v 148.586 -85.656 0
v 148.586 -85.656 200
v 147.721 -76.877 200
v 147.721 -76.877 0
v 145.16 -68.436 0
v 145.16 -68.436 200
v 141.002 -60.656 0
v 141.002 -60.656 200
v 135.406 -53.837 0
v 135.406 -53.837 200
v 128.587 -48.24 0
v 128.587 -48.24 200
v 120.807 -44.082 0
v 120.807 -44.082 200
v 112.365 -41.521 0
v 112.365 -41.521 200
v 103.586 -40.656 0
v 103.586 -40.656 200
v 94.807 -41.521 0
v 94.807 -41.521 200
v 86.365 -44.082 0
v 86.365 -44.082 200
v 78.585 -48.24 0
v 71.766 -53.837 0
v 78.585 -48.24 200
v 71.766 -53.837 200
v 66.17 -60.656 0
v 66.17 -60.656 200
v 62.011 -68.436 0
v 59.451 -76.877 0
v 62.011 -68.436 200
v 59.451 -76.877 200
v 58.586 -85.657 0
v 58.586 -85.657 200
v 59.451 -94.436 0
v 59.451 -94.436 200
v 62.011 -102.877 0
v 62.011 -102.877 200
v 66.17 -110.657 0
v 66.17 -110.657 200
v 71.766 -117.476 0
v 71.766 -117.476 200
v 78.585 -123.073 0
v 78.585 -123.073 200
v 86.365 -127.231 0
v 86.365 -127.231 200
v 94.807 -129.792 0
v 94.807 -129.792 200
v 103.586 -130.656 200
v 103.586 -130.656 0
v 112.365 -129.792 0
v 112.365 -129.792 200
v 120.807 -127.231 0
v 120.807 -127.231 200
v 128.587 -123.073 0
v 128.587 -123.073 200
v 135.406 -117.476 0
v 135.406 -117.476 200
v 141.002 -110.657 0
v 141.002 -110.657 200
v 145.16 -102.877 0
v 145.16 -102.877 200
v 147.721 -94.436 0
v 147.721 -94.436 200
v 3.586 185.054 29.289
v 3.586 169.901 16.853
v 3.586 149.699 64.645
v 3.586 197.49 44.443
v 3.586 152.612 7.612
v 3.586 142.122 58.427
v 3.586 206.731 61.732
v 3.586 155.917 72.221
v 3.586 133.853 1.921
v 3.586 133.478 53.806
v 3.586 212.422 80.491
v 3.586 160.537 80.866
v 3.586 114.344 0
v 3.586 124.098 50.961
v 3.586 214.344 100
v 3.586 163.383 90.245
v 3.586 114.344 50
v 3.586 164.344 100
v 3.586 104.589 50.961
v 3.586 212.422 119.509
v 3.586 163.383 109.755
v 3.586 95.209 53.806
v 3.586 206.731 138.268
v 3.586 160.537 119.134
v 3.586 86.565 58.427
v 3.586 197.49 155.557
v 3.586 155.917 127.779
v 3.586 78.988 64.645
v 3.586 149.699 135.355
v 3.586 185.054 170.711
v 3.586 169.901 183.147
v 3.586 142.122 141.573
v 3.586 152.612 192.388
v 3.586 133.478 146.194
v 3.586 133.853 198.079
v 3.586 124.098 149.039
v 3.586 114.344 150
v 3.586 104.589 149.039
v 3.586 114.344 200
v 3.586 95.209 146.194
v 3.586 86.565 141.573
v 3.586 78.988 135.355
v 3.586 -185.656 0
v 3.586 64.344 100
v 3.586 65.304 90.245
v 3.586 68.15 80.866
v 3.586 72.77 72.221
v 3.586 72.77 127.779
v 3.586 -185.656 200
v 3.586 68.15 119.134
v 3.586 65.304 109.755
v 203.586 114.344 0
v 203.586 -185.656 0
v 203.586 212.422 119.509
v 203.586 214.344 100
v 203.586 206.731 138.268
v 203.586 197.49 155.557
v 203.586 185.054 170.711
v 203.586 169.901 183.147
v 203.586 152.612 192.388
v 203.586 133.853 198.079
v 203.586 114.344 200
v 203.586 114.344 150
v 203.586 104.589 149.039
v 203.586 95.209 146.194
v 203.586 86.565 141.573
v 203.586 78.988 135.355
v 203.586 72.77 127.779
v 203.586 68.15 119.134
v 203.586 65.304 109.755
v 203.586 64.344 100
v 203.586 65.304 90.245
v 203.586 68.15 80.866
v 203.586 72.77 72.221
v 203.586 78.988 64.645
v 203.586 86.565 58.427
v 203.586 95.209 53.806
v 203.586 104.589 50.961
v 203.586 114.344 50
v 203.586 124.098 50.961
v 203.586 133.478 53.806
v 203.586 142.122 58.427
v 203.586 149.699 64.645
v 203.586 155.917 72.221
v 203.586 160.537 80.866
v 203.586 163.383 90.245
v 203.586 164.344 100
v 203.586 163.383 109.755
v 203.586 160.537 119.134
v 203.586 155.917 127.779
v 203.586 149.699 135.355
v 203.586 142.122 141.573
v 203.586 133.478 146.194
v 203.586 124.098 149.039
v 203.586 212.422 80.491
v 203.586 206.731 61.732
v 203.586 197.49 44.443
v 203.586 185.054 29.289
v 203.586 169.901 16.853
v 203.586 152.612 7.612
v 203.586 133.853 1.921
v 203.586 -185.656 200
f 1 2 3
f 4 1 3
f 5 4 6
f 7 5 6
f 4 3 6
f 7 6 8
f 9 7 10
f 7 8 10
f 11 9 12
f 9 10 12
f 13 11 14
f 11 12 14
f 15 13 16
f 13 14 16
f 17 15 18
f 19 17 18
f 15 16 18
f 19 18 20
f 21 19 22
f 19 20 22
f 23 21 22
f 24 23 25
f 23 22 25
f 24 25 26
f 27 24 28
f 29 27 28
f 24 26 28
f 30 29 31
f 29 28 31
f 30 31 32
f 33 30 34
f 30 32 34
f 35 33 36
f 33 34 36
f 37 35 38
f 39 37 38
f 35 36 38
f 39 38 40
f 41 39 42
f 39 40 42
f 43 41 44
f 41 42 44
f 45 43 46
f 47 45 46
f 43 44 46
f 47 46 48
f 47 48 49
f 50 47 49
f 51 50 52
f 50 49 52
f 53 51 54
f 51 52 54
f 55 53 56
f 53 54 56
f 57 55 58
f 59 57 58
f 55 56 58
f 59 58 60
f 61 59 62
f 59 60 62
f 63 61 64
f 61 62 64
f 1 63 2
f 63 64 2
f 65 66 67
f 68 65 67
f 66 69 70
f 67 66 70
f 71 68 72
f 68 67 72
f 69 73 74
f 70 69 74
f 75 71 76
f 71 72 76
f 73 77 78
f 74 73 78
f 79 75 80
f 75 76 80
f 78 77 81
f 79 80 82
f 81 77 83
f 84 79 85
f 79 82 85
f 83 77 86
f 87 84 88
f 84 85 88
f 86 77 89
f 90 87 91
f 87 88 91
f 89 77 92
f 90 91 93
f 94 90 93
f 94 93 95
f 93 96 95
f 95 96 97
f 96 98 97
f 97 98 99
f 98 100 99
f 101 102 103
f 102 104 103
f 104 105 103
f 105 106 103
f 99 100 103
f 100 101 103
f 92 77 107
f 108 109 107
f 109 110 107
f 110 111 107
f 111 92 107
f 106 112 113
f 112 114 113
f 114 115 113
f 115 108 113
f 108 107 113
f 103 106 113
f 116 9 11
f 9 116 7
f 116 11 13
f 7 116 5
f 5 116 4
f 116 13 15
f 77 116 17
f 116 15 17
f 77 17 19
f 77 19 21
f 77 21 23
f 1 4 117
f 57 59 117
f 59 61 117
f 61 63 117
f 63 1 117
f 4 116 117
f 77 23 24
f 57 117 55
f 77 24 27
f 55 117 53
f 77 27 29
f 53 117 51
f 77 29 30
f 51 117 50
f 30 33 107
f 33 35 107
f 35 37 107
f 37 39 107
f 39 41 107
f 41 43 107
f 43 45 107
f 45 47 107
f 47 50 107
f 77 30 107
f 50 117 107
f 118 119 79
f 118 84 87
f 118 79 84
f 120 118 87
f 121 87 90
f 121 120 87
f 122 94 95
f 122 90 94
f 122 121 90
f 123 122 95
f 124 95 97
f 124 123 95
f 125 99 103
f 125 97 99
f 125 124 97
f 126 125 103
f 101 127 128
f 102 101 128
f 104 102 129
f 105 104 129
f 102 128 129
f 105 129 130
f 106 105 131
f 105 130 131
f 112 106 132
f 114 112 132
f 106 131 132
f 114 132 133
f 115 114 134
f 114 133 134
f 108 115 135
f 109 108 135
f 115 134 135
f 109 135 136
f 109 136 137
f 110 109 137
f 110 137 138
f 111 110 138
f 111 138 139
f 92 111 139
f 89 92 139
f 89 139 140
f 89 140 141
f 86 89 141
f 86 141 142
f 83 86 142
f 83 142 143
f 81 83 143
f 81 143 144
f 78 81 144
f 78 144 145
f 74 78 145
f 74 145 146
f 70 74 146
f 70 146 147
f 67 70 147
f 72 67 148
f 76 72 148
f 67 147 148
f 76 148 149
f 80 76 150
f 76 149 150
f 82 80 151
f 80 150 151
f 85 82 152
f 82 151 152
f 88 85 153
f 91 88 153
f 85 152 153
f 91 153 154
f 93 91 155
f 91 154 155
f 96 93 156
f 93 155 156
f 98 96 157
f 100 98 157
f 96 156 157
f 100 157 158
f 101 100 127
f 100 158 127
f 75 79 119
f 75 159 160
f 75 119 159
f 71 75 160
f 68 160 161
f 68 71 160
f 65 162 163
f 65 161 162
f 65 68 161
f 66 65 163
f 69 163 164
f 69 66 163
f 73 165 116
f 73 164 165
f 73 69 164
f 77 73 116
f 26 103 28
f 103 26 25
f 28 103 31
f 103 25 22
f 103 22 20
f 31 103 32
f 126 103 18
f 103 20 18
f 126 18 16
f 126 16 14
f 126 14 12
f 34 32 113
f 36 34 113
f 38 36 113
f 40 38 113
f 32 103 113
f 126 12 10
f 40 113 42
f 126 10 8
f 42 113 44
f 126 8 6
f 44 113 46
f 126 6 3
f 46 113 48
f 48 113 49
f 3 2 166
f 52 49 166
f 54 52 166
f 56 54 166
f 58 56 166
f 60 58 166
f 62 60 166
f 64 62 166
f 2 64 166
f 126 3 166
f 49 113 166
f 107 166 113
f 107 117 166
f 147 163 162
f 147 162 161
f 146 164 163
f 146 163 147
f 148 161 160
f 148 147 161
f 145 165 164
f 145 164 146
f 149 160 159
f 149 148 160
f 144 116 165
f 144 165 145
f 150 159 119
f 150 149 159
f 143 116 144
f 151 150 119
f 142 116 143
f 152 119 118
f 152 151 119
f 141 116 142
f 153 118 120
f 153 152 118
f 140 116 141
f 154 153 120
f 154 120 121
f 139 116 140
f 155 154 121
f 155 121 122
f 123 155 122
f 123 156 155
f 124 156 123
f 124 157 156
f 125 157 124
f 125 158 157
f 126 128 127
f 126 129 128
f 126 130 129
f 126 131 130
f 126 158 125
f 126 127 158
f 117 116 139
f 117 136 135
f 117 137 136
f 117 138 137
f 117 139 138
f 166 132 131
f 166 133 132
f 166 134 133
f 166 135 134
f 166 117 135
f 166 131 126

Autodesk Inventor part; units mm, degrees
ref_plane "YZ Plane" through (0, 0, 0) normal (1, 0, 0) x (0, 1, 0)
ref_plane "XZ Plane" through (0, 0, 0) normal (0, 1, 0) x (-1, 0, 0)
ref_plane "XY Plane" through (0, 0, 0) normal (0, 0, 1) x (1, 0, 0)
sketch "Sketch1" plane through (0, 0, 0) normal (0, 0, 1) x (1, 0, 0)
  line L0 (3.5859, 14.3435) -> (203.5859, 14.3435)
  line L1 (203.5859, 14.3435) -> (203.5859, -185.6565)
  line L2 (203.5859, -185.6565) -> (3.5859, -185.6565)
  line L3 (3.5859, -185.6565) -> (3.5859, 14.3435)
  point P0 (0, 0)
  dimension "d0" = 200
  dimension "d1" = 200
extrude "Extrusion1" add sketch "Sketch1" along normal blind 200
sketch "Sketch2" plane through (0, 0, 200) normal (0, 0, 1) x (1, 0, 0)
  line L0 (203.5859, 14.3435) -> (3.5859, 14.3435) projected
  line L1 (3.5859, -185.6565) -> (203.5859, -185.6565) projected
  circle A0 centre (103.5859, -85.6565) radius 45
  point P0 (0, 0)
  dimension "d4" = 90
extrude "Extrusion2" cut sketch "Sketch2" against normal blind 200
thread "Thread1" size "M90x6" class "6H" standard "ANSI Metric M Profile" full length
sketch "Sketch3" plane through (3.5859, 14.3435, 0) normal (0, 1, 0) x (1, 0, 0)
  line L0 (0, -200) -> (200, -200) projected
  line L1 (200, 0) -> (200, -200) projected
  line L2 (0, -200) -> (200, -200)
  line L3 (200, -200) -> (200, 0)
  line L4 (200, 0) -> (0, 0)
  line L5 (0, 0) -> (0, -200)
  point P0 (-3.5859, 0)
extrude "Extrusion3" add sketch "Sketch3" along normal blind 200
fillet "Fillet1" radius 100 2 edges at (103.5859, 214.3435, 0) (103.5859, 214.3435, 200)
sketch "Sketch4" plane through (3.5859, -185.6565, 0) normal (-1, 0, 0) x (0, 0, 1)
  arc A0 (200, 300) -> (0, 300) centre (100, 300) ccw projected
  circle A1 centre (100, 300) radius 25
  point P0 (0, 185.6565)
  dimension "d12" = 50
hole "Hole1" at (3.5859, 114.3435, 100) direction (1, 0, 0) diameter 100 end through all
properties part number "klocek"
